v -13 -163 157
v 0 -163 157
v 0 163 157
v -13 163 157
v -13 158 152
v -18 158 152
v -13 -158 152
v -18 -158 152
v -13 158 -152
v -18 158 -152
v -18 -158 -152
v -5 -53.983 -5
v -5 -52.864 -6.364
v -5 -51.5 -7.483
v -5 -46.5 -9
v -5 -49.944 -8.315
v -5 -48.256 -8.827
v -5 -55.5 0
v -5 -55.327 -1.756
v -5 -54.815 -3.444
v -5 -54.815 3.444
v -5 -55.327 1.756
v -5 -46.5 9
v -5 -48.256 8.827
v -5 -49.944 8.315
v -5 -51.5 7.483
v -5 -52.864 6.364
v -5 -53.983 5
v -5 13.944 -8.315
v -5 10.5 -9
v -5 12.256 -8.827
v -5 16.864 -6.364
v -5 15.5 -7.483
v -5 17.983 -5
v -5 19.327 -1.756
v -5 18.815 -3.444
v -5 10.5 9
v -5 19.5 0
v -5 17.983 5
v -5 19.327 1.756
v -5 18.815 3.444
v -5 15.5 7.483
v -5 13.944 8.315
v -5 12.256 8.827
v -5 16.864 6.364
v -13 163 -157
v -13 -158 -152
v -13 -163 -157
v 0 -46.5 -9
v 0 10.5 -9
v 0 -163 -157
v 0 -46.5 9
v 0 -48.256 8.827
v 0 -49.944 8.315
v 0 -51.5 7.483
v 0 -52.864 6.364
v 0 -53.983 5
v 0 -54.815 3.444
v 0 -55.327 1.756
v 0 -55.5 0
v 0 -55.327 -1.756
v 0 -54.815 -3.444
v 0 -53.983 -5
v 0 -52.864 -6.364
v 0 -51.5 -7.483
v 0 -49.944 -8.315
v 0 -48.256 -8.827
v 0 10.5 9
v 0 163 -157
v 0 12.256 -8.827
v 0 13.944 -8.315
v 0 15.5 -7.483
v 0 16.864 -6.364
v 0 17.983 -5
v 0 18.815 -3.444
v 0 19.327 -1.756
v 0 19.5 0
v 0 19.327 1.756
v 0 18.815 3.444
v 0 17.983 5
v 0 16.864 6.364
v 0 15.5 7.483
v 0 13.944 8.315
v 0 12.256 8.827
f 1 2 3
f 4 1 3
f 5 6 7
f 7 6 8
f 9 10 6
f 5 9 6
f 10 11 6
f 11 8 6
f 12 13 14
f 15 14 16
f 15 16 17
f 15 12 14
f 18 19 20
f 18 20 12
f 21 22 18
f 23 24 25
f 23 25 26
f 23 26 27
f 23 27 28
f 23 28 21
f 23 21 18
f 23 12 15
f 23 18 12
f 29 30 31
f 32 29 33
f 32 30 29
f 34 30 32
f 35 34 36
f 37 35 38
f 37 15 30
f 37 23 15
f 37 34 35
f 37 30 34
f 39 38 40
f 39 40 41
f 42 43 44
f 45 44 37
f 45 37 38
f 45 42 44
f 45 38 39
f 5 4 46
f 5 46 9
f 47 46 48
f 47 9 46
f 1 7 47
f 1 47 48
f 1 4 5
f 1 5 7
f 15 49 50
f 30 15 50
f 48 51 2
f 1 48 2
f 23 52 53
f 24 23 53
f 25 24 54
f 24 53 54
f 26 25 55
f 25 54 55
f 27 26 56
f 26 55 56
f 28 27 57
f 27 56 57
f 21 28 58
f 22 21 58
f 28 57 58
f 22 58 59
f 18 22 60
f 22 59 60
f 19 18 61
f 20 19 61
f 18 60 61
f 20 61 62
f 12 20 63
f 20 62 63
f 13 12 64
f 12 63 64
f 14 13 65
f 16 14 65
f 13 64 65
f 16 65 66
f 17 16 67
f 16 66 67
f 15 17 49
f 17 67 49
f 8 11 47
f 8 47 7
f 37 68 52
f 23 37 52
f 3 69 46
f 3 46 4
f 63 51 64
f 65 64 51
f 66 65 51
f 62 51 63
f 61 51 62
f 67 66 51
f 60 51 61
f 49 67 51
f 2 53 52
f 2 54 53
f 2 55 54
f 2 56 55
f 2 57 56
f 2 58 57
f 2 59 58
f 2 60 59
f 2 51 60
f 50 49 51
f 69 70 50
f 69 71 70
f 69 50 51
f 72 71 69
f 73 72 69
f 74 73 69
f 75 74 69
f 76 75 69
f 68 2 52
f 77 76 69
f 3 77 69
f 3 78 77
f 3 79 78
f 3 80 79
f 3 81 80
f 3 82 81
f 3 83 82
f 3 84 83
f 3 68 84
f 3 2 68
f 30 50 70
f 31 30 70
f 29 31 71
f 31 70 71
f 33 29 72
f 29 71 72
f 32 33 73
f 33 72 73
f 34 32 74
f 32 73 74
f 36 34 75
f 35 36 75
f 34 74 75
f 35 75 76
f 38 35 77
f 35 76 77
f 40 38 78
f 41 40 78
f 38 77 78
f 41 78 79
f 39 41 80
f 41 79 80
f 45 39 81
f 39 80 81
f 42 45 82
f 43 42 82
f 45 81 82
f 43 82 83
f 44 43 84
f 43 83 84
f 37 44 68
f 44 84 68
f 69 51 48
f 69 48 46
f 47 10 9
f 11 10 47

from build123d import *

# Parameters (mm, degrees)
F0_W     = 326
F0_H     = 314
F1_DEPTH = 18
F3_DEPTH = 5
F4_W     = 326
F4_H     = 314
F4_W_2   = 316
F4_H_2   = 304
F5_DEPTH = 5


with BuildPart() as f1:
    # F0 (on Right) → F1 (new body)
    with BuildSketch(Plane.YZ):
        Rectangle(F0_W, F0_H)
    extrude(amount=-F1_DEPTH)

    # F2 (on face) → F3 (cut)
    with BuildSketch(Plane.YZ):
        with BuildLine():
            ThreePointArc((10.5, -9), (19.5, 0), (10.5, 9))
            Line((10.5, 9), (-46.5, 9))
            ThreePointArc((-46.5, 9), (-55.5, 0), (-46.5, -9))
            Line((-46.5, -9), (10.5, -9))
        make_face()
    extrude(amount=-F3_DEPTH, mode=Mode.SUBTRACT)

    # F4 (on face) → F5 (cut)
    with BuildSketch(Plane(origin=(-18, 0, 0), x_dir=(0, -1, 0), z_dir=(-1, 0, 0))):
        Rectangle(F4_W, F4_H)
        Rectangle(F4_W_2, F4_H_2, mode=Mode.SUBTRACT)
    extrude(amount=-F5_DEPTH, mode=Mode.SUBTRACT)


solid = f1.part
